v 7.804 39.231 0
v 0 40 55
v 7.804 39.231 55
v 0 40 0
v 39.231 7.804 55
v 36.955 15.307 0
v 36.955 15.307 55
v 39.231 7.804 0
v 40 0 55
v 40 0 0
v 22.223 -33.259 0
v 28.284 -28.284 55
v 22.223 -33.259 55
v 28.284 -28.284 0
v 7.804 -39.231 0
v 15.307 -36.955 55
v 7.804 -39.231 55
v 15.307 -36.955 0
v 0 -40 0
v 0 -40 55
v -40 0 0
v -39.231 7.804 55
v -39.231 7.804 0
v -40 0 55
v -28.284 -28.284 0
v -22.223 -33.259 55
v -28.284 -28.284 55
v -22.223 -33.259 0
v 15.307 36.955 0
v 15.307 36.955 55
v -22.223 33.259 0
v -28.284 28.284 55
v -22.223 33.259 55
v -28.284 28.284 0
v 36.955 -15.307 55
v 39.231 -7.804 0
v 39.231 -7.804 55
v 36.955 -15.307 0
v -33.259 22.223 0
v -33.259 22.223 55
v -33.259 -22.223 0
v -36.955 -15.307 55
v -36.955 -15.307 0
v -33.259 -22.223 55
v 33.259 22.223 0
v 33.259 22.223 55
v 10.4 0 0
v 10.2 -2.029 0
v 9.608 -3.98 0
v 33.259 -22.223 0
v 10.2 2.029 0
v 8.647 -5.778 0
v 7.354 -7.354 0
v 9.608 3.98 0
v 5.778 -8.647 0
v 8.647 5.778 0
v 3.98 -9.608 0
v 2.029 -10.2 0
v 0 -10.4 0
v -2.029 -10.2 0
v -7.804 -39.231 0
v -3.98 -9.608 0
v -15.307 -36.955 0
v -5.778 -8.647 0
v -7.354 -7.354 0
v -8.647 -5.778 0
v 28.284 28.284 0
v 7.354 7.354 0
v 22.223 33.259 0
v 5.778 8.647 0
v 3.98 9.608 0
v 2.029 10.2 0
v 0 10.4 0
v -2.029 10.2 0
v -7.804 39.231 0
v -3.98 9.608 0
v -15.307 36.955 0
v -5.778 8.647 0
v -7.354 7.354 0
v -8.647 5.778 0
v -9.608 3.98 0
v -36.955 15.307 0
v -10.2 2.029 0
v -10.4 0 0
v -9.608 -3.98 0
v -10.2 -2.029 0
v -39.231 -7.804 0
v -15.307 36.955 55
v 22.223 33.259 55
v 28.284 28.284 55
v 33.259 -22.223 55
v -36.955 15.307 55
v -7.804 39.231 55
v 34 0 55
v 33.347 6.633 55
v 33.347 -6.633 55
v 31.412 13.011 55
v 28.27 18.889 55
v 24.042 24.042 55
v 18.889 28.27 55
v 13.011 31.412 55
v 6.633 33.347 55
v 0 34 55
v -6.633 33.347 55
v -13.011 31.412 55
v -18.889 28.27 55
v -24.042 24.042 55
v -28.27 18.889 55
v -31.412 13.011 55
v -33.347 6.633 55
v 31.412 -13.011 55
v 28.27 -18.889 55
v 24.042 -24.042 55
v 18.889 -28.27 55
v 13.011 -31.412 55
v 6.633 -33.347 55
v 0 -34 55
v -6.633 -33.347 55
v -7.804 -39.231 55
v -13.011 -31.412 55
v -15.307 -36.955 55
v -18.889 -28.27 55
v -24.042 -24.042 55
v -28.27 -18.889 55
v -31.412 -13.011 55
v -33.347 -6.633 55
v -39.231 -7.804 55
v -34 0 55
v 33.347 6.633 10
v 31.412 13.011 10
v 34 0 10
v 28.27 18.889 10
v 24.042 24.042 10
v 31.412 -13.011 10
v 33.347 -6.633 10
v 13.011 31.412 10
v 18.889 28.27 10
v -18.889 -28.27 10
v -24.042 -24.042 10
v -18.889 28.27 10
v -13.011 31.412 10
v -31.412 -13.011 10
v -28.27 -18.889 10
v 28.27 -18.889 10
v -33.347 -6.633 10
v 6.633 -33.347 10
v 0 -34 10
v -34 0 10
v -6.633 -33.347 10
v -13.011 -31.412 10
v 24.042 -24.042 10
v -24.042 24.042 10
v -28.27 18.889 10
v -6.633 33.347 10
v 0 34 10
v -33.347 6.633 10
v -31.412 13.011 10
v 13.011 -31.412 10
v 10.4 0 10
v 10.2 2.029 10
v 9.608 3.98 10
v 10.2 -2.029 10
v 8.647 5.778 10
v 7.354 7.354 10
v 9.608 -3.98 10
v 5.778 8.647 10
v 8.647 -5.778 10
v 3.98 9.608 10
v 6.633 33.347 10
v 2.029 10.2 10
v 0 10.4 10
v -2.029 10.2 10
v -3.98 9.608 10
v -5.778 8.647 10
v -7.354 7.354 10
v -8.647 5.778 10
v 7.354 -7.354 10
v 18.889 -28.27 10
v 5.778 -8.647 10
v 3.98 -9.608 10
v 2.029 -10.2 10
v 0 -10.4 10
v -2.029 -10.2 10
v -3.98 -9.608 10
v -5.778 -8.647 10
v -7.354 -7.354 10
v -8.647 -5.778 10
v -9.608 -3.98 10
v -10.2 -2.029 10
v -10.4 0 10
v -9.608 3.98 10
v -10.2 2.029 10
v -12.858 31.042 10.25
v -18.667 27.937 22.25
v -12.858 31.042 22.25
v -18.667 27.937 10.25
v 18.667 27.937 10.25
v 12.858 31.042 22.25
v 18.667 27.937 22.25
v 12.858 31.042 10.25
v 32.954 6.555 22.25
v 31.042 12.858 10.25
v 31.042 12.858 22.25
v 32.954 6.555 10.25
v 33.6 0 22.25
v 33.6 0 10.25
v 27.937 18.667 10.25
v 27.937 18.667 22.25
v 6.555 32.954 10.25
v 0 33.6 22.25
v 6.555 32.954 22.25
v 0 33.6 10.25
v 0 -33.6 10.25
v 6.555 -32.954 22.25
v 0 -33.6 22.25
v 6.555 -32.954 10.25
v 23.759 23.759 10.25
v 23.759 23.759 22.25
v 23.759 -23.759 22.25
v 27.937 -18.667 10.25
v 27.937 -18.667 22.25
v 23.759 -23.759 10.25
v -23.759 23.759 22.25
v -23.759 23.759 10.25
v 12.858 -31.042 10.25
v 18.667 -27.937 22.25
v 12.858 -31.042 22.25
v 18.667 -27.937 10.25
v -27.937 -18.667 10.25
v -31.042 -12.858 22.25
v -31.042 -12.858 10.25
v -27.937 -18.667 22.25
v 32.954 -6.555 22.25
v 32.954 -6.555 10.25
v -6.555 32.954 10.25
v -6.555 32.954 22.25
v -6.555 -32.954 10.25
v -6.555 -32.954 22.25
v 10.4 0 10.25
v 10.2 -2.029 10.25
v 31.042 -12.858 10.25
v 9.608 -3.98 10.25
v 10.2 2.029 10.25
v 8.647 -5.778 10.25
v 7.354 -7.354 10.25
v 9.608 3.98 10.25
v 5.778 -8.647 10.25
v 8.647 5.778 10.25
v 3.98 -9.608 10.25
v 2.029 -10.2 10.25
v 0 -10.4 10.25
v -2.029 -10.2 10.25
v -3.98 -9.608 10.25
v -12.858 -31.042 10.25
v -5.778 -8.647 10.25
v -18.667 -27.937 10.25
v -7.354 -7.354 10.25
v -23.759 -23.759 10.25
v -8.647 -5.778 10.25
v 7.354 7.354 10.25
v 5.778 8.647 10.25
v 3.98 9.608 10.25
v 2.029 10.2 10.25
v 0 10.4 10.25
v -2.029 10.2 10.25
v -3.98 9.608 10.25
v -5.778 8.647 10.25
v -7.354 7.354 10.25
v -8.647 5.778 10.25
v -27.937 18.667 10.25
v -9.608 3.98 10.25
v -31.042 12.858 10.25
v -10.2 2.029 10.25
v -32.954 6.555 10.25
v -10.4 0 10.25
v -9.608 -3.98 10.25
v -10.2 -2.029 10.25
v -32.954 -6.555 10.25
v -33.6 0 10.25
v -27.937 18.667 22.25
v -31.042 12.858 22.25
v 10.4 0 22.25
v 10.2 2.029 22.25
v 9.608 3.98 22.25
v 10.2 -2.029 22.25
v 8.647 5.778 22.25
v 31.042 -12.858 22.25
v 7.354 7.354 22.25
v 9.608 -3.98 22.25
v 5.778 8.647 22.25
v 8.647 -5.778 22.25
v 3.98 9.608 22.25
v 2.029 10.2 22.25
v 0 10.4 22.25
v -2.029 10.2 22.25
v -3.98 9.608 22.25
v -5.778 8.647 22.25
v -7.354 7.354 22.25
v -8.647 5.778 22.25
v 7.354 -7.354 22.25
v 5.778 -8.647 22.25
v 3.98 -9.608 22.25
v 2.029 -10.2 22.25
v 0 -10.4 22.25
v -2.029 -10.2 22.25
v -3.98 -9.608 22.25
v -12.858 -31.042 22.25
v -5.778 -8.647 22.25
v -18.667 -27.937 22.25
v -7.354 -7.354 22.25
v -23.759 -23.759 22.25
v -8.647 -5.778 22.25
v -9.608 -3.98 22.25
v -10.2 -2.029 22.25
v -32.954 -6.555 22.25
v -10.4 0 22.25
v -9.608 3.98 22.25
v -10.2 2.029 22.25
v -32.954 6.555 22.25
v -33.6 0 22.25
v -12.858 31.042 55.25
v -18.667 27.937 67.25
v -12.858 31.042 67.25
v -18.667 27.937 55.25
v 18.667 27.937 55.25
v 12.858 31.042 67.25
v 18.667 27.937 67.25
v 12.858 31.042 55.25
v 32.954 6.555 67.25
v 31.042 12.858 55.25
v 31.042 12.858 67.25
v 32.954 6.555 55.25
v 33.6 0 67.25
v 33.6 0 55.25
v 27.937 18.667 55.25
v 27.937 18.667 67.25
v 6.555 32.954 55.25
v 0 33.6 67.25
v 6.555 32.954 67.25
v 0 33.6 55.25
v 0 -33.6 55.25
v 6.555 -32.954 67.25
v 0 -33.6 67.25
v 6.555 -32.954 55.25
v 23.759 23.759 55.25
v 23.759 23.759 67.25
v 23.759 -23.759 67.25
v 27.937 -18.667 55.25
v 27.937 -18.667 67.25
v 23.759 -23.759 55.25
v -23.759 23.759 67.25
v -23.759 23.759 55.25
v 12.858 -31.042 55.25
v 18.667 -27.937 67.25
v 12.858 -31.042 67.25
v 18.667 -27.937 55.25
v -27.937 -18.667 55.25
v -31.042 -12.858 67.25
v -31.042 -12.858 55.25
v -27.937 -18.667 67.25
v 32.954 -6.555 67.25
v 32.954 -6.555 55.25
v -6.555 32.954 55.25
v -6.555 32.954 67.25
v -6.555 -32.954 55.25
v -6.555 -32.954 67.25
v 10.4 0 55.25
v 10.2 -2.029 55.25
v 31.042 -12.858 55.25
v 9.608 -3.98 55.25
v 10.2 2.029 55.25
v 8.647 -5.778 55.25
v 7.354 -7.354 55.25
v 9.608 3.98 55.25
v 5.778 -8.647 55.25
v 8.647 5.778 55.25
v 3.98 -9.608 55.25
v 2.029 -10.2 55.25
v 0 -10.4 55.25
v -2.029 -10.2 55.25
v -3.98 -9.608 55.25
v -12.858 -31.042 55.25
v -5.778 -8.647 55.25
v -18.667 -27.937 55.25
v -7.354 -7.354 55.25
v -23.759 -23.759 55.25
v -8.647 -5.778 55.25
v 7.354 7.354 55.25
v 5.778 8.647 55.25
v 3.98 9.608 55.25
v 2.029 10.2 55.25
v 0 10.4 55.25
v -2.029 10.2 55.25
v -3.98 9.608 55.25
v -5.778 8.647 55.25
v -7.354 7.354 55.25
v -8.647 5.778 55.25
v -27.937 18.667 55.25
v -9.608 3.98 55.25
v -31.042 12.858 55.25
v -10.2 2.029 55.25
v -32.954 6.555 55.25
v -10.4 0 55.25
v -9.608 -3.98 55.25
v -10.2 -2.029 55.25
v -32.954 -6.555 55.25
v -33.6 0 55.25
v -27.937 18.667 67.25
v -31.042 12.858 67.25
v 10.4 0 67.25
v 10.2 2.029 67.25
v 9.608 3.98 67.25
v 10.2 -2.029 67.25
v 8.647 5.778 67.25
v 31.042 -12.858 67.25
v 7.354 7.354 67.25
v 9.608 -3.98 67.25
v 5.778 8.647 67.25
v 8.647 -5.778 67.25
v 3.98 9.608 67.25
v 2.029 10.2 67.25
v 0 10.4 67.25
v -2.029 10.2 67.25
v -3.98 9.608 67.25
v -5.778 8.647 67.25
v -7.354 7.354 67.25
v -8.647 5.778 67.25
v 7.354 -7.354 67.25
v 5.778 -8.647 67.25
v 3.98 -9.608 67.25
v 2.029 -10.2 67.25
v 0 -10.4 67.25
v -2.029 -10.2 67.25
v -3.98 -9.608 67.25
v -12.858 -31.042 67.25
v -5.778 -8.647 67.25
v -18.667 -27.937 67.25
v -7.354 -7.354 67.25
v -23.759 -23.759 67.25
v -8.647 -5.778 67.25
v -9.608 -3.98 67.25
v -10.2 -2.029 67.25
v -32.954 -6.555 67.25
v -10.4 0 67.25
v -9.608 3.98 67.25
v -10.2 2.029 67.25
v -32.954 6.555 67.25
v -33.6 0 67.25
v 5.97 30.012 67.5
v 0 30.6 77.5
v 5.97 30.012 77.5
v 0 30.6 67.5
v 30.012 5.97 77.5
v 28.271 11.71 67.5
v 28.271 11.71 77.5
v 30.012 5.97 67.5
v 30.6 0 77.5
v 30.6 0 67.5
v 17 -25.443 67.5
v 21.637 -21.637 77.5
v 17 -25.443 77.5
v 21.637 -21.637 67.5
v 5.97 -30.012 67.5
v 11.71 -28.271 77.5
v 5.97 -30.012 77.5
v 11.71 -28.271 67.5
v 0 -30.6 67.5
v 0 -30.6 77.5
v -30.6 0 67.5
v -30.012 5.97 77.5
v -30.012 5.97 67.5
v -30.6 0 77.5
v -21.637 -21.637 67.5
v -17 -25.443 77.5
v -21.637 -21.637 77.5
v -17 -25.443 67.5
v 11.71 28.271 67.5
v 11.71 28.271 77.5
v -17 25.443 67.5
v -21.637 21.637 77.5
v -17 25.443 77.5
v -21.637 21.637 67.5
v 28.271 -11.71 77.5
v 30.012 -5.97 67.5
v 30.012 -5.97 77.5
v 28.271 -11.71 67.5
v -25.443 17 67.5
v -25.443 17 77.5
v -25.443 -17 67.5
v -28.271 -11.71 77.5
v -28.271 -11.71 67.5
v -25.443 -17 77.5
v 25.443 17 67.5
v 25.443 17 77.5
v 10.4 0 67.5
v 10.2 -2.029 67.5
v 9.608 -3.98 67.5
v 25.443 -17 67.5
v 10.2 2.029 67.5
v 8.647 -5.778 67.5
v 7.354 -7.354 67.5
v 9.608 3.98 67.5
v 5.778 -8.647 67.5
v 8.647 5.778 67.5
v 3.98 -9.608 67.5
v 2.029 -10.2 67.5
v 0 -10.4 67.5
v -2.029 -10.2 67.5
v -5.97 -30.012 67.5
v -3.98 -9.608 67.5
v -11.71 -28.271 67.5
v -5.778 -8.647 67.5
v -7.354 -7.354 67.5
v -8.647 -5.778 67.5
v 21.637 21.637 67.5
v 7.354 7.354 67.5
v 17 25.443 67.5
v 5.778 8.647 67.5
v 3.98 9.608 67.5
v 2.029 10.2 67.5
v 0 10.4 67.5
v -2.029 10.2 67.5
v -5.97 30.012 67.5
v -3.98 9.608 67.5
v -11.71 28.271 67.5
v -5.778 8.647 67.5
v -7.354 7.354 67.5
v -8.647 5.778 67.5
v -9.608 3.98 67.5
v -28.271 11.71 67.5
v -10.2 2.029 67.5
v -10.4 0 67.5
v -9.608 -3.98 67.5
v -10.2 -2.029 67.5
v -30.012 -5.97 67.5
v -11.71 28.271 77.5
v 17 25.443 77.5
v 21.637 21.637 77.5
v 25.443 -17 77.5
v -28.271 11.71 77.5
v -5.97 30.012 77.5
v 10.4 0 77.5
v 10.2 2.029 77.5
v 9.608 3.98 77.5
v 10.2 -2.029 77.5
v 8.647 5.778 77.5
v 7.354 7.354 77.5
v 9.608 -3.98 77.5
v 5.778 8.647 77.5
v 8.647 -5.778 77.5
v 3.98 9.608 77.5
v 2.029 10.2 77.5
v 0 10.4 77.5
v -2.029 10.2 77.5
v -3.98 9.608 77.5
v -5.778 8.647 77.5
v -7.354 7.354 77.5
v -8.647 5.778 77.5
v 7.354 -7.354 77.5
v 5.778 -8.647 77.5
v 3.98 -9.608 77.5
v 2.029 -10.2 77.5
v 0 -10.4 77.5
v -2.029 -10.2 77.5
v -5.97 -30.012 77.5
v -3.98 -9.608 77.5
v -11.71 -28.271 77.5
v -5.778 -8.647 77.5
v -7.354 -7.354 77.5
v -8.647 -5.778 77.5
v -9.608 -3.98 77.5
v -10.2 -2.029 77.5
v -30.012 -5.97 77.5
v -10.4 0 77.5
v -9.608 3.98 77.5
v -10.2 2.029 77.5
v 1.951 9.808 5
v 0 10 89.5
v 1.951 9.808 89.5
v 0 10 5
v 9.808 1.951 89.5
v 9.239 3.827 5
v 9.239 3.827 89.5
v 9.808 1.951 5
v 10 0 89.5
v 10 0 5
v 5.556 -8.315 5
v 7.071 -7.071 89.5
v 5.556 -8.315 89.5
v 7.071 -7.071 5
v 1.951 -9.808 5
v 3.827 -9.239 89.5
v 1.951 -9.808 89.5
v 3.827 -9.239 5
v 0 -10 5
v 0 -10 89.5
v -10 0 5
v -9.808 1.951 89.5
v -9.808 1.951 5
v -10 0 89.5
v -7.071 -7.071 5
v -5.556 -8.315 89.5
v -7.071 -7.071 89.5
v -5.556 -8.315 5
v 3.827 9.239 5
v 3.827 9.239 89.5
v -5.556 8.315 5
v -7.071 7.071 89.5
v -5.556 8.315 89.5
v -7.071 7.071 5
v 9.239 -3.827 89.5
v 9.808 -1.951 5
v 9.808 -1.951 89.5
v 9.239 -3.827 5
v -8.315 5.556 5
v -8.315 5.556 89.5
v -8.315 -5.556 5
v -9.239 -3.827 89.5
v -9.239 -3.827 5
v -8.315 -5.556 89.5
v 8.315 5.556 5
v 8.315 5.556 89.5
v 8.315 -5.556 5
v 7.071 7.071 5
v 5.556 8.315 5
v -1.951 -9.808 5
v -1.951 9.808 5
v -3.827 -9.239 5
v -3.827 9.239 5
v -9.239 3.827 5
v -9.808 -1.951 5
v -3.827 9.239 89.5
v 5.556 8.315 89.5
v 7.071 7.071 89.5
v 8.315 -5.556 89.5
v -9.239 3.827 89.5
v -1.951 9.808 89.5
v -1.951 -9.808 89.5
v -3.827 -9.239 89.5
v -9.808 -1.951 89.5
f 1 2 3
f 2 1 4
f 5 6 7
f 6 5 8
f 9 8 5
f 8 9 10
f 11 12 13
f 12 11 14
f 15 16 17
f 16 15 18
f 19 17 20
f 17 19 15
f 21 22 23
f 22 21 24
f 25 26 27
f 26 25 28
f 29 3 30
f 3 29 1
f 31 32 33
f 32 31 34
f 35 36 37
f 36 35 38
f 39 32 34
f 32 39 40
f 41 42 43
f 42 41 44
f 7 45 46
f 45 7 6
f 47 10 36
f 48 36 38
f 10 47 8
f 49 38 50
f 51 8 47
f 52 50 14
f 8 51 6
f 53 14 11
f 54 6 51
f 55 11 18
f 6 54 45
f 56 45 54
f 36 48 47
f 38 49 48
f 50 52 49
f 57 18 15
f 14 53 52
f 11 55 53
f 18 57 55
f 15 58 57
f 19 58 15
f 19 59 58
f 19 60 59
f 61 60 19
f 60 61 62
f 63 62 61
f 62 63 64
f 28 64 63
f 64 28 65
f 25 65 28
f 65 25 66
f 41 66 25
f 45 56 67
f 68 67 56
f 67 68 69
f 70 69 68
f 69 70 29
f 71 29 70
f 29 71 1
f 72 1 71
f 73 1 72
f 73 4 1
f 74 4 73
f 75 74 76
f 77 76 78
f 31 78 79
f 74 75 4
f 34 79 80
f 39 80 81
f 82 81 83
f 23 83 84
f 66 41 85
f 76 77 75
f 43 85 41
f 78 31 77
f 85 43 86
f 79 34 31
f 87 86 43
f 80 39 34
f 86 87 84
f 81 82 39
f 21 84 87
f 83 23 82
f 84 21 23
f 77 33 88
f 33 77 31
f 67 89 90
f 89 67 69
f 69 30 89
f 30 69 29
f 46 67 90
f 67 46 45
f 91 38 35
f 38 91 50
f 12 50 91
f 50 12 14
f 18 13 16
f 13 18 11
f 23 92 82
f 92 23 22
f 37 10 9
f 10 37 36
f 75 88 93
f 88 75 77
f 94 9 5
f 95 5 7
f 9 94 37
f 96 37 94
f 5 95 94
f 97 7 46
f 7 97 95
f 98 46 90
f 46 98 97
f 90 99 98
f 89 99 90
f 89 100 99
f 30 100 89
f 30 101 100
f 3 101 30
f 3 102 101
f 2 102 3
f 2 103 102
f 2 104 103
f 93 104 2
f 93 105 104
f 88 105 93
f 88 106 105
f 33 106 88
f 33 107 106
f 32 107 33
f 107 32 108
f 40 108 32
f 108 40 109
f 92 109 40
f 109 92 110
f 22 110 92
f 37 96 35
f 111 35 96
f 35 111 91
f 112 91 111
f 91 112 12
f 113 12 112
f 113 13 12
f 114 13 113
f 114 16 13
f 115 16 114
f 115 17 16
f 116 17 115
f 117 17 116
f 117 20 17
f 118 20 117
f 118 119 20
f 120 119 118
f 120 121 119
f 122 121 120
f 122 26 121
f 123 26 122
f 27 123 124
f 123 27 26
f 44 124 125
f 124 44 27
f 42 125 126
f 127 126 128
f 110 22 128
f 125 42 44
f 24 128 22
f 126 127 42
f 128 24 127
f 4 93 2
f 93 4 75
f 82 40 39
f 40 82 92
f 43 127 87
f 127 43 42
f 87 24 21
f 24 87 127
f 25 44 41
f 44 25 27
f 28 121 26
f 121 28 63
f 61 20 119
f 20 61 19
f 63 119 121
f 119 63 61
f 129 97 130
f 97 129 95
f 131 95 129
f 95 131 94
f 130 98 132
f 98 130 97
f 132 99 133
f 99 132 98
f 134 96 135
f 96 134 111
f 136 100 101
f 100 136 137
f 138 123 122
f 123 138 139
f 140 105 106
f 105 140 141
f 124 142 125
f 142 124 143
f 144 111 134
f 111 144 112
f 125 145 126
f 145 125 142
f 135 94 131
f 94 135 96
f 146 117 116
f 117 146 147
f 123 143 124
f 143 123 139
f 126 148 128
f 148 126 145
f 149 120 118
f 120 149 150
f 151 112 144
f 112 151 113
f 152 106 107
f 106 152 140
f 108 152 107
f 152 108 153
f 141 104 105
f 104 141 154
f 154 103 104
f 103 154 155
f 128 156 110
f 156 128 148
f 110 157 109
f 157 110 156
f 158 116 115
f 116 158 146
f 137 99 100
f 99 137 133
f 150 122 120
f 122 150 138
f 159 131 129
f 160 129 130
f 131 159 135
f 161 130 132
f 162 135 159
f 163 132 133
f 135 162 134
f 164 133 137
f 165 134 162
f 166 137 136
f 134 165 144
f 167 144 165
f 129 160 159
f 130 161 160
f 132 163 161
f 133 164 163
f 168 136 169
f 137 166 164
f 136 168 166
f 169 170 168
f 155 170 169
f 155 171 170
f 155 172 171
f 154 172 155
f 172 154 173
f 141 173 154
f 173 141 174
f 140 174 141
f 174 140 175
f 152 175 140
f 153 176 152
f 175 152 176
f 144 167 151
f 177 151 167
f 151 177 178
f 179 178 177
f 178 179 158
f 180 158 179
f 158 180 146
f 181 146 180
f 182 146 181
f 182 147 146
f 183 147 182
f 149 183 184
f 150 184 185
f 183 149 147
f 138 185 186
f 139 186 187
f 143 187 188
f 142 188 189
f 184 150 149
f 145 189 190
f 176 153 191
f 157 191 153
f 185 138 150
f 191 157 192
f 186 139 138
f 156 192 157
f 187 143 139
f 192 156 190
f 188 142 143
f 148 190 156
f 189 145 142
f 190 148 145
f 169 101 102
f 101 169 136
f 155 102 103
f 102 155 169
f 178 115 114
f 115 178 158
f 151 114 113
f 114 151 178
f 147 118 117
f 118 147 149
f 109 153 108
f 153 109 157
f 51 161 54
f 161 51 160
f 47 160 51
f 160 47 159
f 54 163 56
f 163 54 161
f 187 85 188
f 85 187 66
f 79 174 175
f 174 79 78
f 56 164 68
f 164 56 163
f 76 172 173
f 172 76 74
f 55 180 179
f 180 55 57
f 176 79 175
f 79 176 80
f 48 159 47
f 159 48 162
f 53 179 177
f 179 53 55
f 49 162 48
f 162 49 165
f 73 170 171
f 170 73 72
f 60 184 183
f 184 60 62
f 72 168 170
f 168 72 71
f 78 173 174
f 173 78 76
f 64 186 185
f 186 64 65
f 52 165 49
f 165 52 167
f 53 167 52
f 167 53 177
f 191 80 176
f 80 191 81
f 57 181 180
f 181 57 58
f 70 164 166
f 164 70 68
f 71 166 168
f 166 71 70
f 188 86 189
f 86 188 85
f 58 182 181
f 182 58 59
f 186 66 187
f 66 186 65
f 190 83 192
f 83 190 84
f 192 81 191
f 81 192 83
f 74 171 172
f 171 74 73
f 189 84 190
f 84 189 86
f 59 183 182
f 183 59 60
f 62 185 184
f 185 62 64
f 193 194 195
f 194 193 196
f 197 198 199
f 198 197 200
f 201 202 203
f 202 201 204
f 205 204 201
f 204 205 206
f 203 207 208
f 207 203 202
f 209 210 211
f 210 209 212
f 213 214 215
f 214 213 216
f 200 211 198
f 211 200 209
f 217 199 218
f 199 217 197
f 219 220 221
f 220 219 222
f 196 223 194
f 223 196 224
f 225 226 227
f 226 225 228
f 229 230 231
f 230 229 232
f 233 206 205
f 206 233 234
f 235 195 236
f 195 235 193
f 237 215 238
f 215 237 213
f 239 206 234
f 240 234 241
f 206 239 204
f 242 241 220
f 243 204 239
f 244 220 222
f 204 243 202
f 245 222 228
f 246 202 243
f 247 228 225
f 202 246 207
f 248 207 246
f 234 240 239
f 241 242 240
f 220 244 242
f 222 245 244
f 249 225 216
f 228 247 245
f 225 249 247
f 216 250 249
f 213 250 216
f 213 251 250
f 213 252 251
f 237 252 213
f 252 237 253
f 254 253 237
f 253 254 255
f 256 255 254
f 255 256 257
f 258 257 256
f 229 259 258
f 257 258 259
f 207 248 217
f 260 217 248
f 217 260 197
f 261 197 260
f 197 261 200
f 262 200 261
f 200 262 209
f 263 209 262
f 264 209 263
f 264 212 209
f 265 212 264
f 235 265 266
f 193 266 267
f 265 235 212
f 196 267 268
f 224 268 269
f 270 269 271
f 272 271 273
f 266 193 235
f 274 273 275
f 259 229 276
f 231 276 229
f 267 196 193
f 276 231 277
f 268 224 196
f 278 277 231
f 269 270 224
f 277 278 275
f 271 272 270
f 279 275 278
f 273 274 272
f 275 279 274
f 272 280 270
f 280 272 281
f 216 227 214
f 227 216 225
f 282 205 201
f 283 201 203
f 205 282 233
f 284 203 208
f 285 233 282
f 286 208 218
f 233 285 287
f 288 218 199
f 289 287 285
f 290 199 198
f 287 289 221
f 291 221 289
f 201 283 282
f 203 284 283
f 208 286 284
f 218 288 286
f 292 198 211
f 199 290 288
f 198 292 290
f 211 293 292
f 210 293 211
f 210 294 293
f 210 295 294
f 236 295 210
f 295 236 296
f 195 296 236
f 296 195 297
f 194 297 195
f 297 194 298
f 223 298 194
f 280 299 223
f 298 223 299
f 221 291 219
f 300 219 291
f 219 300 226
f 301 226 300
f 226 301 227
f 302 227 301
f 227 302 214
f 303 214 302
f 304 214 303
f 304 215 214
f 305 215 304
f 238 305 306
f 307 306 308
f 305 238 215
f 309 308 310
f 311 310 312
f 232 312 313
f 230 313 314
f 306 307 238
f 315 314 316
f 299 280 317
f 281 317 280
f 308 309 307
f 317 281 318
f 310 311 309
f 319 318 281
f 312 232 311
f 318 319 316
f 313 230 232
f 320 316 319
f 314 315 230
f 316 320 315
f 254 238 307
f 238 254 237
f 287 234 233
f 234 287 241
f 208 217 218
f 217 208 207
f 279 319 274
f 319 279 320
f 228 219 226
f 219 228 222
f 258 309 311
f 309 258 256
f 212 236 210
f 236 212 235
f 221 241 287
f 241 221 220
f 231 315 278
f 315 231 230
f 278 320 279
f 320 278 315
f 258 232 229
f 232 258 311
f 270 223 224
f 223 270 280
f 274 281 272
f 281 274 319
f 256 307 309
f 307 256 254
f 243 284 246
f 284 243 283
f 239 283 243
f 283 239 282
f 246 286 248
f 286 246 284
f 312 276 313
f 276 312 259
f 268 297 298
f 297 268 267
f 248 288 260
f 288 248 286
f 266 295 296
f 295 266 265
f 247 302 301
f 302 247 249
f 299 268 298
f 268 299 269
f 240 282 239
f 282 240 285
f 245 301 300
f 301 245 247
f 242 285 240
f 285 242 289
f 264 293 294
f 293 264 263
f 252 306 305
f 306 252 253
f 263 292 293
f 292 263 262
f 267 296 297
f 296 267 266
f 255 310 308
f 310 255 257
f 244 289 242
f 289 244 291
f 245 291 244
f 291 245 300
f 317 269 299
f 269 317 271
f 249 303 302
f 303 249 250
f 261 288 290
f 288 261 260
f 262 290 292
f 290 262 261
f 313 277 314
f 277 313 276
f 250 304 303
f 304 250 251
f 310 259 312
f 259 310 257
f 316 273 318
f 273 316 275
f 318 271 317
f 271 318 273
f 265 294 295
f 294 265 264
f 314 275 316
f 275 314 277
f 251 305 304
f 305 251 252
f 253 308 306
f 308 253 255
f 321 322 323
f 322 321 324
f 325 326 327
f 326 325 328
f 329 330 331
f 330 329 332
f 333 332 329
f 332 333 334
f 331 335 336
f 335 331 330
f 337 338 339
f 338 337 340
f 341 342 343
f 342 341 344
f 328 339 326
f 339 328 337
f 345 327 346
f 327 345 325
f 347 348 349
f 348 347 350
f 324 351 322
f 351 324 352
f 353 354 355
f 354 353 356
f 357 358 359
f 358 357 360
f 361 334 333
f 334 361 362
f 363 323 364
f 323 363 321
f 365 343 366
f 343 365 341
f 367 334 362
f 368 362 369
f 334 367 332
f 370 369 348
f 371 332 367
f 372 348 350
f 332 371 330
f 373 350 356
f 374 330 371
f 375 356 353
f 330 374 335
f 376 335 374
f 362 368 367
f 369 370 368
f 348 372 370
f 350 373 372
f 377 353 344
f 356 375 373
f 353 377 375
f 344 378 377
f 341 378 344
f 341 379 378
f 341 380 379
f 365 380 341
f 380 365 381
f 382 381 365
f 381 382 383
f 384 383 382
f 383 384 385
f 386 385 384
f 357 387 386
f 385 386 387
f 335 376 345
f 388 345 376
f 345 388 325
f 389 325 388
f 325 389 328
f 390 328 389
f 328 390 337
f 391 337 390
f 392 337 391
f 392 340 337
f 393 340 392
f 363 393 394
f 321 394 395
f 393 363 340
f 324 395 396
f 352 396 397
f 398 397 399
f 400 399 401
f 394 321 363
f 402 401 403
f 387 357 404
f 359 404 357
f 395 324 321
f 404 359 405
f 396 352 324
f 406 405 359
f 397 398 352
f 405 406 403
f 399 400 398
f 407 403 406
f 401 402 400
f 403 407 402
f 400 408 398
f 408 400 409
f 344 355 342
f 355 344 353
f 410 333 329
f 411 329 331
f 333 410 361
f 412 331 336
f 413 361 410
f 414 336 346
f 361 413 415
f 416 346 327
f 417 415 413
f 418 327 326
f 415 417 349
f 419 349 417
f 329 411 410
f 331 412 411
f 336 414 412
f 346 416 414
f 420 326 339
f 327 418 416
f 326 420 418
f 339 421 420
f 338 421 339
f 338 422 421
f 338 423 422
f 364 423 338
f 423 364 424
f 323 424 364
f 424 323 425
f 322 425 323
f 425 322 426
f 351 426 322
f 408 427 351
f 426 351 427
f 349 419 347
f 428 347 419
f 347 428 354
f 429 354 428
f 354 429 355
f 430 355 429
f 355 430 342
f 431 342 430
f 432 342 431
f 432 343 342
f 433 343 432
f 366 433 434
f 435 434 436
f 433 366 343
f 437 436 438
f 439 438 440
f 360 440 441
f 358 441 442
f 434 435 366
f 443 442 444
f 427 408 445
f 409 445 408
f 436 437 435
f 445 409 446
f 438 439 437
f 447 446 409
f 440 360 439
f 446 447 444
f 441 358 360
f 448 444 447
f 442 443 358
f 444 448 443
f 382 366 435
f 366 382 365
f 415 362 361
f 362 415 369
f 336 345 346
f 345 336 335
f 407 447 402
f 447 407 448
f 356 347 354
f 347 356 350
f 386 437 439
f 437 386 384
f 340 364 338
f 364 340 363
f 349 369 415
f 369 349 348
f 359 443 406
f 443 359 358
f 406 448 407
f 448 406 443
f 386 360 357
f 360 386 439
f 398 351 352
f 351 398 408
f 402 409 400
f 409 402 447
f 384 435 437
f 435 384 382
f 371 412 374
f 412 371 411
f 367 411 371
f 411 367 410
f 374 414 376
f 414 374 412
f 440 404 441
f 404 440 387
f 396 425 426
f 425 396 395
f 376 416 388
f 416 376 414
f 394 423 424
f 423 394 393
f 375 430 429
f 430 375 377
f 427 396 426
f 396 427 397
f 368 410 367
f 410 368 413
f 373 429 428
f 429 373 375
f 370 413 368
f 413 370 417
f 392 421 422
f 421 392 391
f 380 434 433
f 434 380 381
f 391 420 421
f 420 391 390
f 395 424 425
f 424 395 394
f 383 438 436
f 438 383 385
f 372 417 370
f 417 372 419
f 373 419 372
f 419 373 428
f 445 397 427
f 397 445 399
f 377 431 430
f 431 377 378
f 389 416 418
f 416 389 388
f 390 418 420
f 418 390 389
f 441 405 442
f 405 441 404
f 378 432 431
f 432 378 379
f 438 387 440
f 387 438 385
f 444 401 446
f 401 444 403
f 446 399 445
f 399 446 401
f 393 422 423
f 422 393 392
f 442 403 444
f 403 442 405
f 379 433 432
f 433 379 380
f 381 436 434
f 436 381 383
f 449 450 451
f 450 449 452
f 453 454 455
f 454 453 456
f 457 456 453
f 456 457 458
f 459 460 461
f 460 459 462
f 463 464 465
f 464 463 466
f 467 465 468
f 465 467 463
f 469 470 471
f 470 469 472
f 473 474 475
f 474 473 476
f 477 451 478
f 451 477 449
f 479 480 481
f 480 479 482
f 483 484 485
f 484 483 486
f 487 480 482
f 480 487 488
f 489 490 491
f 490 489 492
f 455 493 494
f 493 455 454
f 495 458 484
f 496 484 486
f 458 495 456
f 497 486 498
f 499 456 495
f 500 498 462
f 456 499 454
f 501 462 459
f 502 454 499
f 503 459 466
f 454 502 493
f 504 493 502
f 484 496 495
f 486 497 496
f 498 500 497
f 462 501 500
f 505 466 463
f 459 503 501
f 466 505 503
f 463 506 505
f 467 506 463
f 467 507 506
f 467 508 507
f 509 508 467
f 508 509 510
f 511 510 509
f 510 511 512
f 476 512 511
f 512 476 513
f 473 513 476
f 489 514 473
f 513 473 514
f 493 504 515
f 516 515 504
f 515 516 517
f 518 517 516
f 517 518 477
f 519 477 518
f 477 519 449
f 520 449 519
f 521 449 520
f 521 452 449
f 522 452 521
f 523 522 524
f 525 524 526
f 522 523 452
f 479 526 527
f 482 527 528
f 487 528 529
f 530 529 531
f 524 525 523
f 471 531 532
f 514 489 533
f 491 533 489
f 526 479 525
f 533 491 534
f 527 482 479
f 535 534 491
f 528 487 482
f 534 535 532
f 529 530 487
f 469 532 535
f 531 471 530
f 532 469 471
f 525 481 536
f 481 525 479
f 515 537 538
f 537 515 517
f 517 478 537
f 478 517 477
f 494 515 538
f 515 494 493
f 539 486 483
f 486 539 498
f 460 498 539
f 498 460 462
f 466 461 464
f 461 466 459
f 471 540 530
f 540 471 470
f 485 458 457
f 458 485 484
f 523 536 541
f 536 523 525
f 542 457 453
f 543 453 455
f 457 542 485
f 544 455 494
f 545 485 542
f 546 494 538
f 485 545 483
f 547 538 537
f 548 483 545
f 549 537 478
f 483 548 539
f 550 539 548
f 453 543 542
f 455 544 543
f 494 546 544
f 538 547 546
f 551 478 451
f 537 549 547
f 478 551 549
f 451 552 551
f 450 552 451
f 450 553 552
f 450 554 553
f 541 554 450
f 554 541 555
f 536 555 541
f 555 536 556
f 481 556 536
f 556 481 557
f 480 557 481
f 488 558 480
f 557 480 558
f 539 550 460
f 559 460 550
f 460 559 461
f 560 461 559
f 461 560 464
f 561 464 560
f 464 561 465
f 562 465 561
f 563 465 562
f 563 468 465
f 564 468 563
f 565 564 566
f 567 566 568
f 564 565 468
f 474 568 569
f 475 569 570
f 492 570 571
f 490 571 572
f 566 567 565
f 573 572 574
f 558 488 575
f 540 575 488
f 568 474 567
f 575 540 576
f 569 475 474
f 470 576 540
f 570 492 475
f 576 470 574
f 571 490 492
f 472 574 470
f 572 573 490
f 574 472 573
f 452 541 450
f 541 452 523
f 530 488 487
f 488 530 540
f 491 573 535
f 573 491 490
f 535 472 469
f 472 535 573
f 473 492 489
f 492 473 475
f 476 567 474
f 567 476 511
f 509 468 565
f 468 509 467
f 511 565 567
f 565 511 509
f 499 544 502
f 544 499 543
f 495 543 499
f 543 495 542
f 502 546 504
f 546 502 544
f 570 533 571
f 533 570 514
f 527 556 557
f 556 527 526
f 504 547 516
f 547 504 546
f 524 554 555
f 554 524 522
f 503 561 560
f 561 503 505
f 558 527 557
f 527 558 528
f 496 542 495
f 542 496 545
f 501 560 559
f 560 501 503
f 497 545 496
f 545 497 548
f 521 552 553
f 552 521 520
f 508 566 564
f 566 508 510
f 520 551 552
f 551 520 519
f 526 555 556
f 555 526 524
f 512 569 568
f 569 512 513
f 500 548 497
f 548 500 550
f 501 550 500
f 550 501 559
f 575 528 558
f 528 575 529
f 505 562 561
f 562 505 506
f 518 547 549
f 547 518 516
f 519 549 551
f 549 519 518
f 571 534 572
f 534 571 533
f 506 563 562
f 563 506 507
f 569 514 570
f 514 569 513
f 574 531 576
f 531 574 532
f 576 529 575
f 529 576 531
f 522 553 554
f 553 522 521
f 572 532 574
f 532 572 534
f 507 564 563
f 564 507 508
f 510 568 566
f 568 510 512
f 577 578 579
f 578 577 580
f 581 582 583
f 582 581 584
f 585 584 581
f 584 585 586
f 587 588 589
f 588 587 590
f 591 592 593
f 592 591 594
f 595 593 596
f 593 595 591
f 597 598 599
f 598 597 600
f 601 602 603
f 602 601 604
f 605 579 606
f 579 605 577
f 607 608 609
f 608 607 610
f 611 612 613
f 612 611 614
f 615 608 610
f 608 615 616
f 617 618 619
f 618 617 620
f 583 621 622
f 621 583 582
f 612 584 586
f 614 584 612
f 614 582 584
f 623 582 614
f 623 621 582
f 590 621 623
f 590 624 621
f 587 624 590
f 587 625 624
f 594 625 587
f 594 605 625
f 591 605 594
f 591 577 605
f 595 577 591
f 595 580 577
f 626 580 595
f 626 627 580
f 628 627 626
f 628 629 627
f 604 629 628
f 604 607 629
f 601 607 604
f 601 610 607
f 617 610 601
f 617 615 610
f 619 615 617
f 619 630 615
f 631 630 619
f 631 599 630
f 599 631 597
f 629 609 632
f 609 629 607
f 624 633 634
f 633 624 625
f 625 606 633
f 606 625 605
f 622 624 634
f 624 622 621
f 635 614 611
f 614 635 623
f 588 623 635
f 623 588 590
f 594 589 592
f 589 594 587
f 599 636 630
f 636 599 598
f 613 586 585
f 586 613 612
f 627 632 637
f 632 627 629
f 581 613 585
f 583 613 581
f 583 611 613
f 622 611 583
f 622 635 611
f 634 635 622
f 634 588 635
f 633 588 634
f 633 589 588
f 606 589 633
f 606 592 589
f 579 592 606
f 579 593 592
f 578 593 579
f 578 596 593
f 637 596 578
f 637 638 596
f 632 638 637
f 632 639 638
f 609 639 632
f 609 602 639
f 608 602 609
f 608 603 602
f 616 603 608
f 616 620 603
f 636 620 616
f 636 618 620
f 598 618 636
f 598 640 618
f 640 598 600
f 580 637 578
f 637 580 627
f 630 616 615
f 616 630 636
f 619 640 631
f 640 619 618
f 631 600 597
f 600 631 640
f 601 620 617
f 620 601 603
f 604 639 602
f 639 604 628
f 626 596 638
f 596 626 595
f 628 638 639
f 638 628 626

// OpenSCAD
$fn = 32;

// ------------------------------------------------------------------------
// Bearing housing: housing d80, two bearings and a shaft
// Every part is its own module, assembly() places them once.
// ------------------------------------------------------------------------

// --- part 1 ---
module housing() {
  difference() {
    cylinder(h = 55, d = 80);
    translate([0, 0, 10]) cylinder(h = 46, d = 68);
    translate([0, 0, -1]) cylinder(h = 12, d = 20.8);
  }
}

// --- part 2 ---
module bearing_lower() {
  difference() {
      translate([0, 0, 0]) cylinder(h = 12, d = 67.2);
      translate([0, 0, -1]) cylinder(h = 14, d = 20.8);
    }
}

// --- part 3 ---
module bearing_upper() {
  difference() {
      translate([0, 0, 0]) cylinder(h = 12, d = 67.2);
      translate([0, 0, -1]) cylinder(h = 14, d = 20.8);
    }
}

// --- part 4 ---
module spacer() {
  difference() {
      translate([0, 0, 0]) cylinder(h = 10, d = 61.2);
      translate([0, 0, -1]) cylinder(h = 12, d = 20.8);
    }
}

// --- part 5 ---
module shaft() {
  translate([0, 0, -42.25]) cylinder(h = 84.5, d = 20);
}

// --- assembly ---
module assembly() {
  translate([0, 0, 0]) rotate([0, 0, 0]) housing();
  translate([0, 0, 10.25]) rotate([0, 0, 0]) bearing_lower();
  translate([0, 0, 55.25]) rotate([0, 0, 0]) bearing_upper();
  translate([0, 0, 67.5]) rotate([0, 0, 0]) spacer();
  translate([0, 0, 47.25]) rotate([0, 0, 0]) shaft();
}

assembly();
